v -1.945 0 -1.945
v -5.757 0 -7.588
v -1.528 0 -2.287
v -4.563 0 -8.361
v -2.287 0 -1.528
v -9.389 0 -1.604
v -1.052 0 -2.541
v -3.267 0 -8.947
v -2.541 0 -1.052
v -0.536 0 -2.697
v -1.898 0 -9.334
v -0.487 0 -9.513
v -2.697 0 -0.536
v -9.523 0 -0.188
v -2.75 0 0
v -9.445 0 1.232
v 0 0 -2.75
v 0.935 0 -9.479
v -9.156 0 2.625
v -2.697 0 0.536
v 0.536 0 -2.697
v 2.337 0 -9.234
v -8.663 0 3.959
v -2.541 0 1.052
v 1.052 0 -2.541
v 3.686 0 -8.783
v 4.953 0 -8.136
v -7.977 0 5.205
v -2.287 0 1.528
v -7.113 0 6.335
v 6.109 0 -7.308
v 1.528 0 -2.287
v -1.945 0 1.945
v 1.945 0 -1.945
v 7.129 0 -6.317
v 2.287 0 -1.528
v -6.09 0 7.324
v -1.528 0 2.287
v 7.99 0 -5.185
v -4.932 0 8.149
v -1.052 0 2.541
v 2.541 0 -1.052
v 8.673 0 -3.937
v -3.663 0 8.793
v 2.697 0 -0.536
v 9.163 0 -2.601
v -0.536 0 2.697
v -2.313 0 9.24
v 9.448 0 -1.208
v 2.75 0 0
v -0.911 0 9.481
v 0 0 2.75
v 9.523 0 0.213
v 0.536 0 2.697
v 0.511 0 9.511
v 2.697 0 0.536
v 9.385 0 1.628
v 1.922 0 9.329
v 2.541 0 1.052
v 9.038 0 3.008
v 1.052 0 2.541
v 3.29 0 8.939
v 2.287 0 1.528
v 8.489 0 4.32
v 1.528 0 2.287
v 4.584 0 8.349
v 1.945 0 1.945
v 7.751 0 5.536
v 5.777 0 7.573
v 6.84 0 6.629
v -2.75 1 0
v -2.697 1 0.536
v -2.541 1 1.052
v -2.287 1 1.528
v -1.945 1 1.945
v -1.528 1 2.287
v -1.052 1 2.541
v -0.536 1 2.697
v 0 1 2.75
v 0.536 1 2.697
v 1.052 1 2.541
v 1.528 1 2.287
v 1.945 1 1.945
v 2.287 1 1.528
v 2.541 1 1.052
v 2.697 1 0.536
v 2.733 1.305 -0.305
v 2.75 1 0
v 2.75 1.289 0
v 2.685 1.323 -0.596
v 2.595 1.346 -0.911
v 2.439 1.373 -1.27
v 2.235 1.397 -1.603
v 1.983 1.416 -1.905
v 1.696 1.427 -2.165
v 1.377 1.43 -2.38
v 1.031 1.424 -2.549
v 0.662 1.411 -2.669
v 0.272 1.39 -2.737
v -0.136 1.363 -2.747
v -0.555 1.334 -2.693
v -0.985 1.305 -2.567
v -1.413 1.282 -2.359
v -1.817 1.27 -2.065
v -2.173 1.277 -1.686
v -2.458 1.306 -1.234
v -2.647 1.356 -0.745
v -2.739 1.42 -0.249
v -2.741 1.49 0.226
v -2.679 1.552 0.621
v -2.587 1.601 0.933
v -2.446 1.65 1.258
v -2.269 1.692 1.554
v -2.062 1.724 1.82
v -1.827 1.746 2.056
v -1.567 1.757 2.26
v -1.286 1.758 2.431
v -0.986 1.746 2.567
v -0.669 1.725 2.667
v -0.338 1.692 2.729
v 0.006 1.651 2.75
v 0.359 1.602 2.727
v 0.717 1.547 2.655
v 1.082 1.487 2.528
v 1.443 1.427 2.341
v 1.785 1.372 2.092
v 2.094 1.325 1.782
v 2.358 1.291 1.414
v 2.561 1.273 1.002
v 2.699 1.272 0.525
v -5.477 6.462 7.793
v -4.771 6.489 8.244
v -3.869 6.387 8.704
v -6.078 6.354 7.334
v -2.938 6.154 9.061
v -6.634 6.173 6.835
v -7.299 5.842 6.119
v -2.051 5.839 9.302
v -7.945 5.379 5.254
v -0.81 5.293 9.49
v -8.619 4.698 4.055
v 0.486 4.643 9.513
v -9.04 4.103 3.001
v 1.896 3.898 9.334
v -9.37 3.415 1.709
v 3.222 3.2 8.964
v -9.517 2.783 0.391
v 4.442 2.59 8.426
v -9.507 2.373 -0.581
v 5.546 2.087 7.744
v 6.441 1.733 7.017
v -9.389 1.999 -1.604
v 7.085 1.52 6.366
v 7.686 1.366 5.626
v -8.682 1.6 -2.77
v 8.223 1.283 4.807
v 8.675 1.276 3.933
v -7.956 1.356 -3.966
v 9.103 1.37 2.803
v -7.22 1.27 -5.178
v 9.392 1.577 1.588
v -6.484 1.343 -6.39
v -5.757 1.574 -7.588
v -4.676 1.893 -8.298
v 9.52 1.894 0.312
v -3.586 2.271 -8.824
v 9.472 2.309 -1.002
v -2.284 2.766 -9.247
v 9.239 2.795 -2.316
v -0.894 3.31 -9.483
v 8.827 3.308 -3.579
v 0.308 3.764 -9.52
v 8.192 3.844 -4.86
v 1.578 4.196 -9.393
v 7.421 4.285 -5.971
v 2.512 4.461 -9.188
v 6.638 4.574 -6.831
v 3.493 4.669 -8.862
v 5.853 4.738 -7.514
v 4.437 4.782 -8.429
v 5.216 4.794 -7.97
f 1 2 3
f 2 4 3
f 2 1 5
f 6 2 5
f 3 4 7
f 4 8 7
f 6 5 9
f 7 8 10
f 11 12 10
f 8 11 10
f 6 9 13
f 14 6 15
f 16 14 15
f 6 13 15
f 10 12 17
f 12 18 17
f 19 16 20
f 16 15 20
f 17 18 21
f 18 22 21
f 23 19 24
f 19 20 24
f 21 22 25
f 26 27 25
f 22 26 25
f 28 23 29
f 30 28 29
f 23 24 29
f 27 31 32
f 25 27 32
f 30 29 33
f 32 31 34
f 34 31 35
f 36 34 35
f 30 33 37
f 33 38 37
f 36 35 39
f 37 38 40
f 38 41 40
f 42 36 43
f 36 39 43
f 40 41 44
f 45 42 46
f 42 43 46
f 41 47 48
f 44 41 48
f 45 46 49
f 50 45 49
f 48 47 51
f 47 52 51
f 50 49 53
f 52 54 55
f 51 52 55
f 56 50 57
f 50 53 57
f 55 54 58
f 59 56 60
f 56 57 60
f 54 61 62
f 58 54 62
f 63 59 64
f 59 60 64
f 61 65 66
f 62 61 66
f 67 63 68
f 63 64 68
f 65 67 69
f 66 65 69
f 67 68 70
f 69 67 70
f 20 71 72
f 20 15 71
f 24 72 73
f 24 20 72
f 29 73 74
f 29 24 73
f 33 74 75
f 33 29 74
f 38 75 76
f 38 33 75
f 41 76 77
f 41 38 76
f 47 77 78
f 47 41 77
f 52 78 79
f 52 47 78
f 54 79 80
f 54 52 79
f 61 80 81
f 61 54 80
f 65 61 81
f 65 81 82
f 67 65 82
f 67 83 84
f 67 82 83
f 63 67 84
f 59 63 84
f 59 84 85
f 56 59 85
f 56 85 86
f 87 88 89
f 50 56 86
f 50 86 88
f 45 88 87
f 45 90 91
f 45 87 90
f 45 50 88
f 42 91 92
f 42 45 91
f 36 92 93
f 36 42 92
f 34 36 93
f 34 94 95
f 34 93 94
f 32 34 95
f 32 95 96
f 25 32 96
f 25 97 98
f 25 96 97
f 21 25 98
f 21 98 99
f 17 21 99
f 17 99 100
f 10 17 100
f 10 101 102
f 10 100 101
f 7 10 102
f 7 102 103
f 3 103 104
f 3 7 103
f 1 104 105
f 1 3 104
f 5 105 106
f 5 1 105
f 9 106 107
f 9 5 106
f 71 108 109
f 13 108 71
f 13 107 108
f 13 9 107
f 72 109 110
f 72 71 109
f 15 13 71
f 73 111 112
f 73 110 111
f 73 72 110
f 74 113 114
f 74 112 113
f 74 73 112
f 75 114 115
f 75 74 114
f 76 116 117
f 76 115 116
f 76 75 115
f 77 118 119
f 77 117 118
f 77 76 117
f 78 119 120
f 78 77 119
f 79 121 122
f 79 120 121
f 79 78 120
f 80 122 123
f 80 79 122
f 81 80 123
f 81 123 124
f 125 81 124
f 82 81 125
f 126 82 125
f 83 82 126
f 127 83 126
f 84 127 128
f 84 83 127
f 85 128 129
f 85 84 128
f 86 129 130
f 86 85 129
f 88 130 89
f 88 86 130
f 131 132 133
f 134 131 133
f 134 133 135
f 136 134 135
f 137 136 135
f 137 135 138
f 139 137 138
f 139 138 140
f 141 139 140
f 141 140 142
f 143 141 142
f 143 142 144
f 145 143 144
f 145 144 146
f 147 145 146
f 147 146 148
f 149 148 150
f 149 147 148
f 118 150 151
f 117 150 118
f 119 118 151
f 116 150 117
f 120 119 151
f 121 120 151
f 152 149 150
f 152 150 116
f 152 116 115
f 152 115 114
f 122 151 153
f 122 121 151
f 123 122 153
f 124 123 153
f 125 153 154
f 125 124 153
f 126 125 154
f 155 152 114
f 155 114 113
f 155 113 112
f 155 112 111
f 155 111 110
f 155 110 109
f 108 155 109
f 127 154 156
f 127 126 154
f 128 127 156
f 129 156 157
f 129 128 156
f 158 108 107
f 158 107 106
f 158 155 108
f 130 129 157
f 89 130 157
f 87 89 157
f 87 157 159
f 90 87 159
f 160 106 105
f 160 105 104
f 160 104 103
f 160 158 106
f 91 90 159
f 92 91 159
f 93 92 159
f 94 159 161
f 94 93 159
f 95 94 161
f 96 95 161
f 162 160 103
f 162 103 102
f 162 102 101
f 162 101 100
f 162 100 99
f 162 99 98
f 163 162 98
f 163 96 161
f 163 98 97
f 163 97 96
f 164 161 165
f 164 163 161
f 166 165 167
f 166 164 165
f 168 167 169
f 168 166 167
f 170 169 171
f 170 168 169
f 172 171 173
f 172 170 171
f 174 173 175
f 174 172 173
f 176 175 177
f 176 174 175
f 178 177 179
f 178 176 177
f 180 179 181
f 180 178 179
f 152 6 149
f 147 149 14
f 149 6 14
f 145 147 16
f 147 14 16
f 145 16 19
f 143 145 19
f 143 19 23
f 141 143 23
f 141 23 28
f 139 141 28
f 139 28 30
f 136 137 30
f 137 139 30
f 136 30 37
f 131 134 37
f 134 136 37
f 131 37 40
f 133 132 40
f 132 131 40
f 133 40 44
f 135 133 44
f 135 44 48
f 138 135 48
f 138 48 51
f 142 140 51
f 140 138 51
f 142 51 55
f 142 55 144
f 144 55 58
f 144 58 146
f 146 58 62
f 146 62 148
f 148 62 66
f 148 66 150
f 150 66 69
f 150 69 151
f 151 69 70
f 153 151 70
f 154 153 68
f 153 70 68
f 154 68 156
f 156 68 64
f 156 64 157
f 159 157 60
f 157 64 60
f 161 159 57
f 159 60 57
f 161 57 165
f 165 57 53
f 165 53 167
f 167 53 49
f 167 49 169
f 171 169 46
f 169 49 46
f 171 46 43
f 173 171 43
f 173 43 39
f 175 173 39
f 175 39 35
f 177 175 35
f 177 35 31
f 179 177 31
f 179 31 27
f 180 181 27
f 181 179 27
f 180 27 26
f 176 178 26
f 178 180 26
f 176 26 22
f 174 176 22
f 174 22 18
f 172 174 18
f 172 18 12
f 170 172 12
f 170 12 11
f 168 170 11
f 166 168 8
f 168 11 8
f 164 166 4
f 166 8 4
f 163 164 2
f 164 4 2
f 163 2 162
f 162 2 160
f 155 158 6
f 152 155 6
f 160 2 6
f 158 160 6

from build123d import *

# Parameters (mm, degrees)
SKETCH2_R                   = 9.525
BOSS_EXTRUDE1_DEPTH         = 1
M5_CLEARANCE_HOLE1_D        = 5.5
BOSS_EXTRUDE2_START         = -1.269999898
BOSS_EXTRUDE2_OUTLINE_R     = 9.525
BOSS_EXTRUDE2_OUTLINE_R_2   = 2.75
BOSS_EXTRUDE2_DEPTH         = 0.269999898
BOSS_EXTRUDE2_START_2       = 1.269999898
BOSS_EXTRUDE2_2_OUTLINE_R   = 9.525
BOSS_EXTRUDE2_2_OUTLINE_R_2 = 2.75
BOSS_EXTRUDE2_2_DEPTH       = 5.2217713
BOSS_EXTRUDE2_START_3       = -11
BOSS_EXTRUDE2_3_DEPTH       = 22
CUT_EXTRUDE1_DEPTH          = 15.546848663
CUT_EXTRUDE1_DEPTH_BACK     = 15.546848663


with BuildPart() as part:
    # Sketch2 → Boss-Extrude1 (new body)
    with BuildSketch(Plane(origin=(0, 0, 0), x_dir=(1, 0, 0), z_dir=(0, 1, 0))):
        with Locations(Location((0, 0, 0), (0, 0, 270))):
            Circle(SKETCH2_R)
    extrude(amount=BOSS_EXTRUDE1_DEPTH)

    # M5 Clearance Hole1 (through all)
    with Locations(Plane(origin=(0, 1, 0), x_dir=(1, 0, 0), z_dir=(0, 1, 0))):
        with Locations((0, 0)):
            Hole(M5_CLEARANCE_HOLE1_D / 2)

    # Boss-Extrude2: read off the stored shape, not the designer's step
    # Boss-Extrude2 outline → Boss-Extrude2 (add)
    with BuildSketch(Plane.XZ.offset(BOSS_EXTRUDE2_START)):
        Circle(BOSS_EXTRUDE2_OUTLINE_R)
        Circle(BOSS_EXTRUDE2_OUTLINE_R_2, mode=Mode.SUBTRACT)
    extrude(amount=BOSS_EXTRUDE2_DEPTH)

    # Boss-Extrude2 2 outline → Boss-Extrude2 2 (add)
    with BuildSketch(Plane(origin=(0, 0, 0), x_dir=(1, 0, 0), z_dir=(0, 1, 0)).offset(BOSS_EXTRUDE2_START_2)):
        Circle(BOSS_EXTRUDE2_2_OUTLINE_R)
        Circle(BOSS_EXTRUDE2_2_OUTLINE_R_2, mode=Mode.SUBTRACT)
    extrude(amount=BOSS_EXTRUDE2_2_DEPTH)

    # Boss-Extrude2 3 outline → Boss-Extrude2 3 (cut)
    with BuildSketch(Plane(origin=(0, 0, 0), x_dir=(0.51884630524159, 0, -0.8548675403459595), z_dir=(0.8548675403459595, 0, 0.5188463052415904)).offset(BOSS_EXTRUDE2_START_3)):
        with BuildLine():
            ThreePointArc((-9.525000037, 6.491771171), (-0.383965362, 1.319816038), (9.525621352, 4.799431821))
            Line((9.525621352, 4.799431821), (11, 6.211953819))
            Line((11, 6.211953819), (11, 6.491771198))
            Line((11, 6.491771198), (-9.525000037, 6.491771171))
        make_face()
    extrude(amount=BOSS_EXTRUDE2_3_DEPTH, mode=Mode.SUBTRACT)

    # Sketch7 → Cut-Extrude1 (cut, two sides: drawn at the far end of the back side and taken through both)
    with BuildSketch(Plane(origin=(0, 1, 0), x_dir=(1, 0, 0), z_dir=(0, 1, 0)).offset(-CUT_EXTRUDE1_DEPTH_BACK)):
        Polygon((-5.757007623, 7.588312608), (-9.388931759, 1.604239825), (-9.95857539, 1.949974666), (-6.326651253, 7.934047449), align=None)
    extrude(amount=CUT_EXTRUDE1_DEPTH + CUT_EXTRUDE1_DEPTH_BACK, mode=Mode.SUBTRACT)


solid = part.part
